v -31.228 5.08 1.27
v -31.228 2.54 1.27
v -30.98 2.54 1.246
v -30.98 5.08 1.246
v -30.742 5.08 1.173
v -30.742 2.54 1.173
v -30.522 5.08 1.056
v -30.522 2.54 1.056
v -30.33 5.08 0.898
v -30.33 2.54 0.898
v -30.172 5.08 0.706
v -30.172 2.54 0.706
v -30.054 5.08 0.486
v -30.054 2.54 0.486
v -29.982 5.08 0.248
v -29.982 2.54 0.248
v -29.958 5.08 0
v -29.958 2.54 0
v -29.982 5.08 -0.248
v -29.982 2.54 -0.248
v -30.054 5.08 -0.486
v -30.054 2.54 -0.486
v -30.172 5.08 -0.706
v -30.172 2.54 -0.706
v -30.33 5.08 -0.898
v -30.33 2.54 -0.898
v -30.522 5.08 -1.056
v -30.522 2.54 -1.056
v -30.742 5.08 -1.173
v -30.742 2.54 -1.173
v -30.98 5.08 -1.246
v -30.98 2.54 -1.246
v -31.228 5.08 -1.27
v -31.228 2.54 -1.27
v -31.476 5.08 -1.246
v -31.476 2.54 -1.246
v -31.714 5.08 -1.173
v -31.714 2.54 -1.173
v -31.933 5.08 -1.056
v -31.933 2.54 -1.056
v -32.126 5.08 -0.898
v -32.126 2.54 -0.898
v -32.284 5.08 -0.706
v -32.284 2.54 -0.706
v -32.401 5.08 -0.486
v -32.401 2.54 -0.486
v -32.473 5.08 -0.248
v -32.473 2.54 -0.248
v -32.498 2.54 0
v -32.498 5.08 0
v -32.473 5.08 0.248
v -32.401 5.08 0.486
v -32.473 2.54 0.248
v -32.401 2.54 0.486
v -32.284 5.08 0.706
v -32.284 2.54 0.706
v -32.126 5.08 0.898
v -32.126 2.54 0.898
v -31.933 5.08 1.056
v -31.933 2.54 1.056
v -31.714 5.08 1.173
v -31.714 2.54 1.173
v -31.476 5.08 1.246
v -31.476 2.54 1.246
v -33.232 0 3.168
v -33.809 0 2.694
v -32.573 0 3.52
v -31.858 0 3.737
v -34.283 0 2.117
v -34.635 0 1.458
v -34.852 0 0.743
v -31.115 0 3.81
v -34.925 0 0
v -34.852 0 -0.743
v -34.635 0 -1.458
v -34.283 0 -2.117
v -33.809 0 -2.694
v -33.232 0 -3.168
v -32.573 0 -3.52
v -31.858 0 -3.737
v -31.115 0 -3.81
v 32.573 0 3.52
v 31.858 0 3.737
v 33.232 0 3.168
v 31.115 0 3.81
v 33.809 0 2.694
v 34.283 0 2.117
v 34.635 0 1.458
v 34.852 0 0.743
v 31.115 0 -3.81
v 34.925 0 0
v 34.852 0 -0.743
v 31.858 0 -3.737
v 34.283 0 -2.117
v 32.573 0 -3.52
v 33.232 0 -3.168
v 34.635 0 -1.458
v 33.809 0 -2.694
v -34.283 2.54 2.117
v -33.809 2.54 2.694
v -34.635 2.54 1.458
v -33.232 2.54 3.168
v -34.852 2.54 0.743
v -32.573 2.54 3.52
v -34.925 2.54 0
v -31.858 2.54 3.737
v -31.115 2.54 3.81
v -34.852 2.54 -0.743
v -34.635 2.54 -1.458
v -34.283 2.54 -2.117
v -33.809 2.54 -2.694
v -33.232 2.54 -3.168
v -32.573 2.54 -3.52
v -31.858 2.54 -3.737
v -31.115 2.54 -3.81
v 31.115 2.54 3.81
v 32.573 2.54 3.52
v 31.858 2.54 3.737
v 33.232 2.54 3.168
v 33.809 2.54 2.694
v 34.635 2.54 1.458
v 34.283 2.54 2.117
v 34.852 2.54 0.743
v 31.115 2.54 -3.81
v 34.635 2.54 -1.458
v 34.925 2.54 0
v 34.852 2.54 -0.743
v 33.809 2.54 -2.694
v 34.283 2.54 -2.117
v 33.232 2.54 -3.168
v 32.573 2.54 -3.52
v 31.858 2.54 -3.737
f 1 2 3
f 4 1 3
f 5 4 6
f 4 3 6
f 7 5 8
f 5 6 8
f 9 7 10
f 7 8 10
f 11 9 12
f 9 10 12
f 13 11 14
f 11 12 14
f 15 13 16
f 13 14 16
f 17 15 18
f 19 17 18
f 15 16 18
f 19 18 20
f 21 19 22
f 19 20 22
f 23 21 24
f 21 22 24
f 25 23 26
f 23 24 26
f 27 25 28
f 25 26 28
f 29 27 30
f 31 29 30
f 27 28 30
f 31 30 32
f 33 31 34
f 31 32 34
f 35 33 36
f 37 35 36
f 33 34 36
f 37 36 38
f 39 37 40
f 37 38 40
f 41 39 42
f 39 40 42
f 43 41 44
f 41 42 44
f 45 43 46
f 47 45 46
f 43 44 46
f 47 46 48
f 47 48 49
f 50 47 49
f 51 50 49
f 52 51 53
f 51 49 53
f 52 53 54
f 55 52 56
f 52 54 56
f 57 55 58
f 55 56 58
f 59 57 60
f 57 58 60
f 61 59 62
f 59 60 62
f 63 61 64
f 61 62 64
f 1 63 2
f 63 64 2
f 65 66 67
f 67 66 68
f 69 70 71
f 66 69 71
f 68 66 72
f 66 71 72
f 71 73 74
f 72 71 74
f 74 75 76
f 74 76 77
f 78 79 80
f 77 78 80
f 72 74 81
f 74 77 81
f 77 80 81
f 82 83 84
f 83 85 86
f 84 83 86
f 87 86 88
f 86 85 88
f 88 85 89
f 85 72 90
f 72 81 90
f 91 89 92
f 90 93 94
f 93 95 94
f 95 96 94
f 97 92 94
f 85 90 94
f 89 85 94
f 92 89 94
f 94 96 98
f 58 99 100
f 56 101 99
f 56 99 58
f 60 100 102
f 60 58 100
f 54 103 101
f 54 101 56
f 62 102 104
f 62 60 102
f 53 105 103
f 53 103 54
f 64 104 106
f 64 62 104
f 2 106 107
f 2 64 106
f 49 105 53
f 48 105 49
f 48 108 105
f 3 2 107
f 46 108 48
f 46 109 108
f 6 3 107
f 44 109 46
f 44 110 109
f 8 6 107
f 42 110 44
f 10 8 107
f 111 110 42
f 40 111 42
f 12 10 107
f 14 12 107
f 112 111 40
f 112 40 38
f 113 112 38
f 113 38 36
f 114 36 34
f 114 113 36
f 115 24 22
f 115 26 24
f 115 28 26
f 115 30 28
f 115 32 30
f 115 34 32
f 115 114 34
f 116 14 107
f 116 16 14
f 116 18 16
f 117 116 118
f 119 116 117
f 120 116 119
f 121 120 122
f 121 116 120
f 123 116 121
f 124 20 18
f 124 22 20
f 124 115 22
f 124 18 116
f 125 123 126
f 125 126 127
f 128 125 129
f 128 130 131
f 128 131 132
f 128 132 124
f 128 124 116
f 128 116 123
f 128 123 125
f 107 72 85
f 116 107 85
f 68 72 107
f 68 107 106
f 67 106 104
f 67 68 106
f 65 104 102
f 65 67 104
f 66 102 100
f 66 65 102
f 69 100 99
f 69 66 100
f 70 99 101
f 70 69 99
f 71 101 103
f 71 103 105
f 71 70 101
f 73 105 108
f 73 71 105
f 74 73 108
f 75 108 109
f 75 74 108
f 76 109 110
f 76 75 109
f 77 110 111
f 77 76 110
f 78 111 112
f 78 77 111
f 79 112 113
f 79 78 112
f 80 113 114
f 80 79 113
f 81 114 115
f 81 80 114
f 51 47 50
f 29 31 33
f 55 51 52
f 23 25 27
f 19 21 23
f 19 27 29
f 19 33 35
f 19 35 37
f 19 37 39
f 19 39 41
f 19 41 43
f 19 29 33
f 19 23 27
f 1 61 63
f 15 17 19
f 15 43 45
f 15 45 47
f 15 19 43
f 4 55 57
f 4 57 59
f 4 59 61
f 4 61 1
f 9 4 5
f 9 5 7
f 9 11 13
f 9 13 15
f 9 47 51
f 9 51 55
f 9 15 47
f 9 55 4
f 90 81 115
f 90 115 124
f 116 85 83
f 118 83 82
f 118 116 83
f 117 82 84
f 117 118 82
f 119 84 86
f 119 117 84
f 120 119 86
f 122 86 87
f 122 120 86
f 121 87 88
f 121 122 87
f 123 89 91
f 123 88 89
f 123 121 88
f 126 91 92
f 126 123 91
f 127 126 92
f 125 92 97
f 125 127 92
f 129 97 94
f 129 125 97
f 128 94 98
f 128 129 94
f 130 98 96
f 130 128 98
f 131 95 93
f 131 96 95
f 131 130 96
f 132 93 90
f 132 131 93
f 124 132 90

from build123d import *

# Parameters (mm, degrees)
SKETCH2_W           = 69.85
SKETCH2_H           = 7.62
BOSS_EXTRUDE1_DEPTH = 2.54
FILLET1_RADIUS      = 3.81
FILLET1_LENGTH      = 2.54
FILLET2_RADIUS      = 3.81
FILLET2_LENGTH      = 2.54
SKETCH3_R           = 1.27
BOSS_EXTRUDE2_DEPTH = 2.54


with BuildPart() as part:
    # Sketch2 → Boss-Extrude1 (new body)
    with BuildSketch(Plane(origin=(0, 0, 0), x_dir=(1, 0, 0), z_dir=(0, 1, 0))):
        Rectangle(SKETCH2_W, SKETCH2_H)
    extrude(amount=BOSS_EXTRUDE1_DEPTH)

    # Fillet1: full round fillet: the end face becomes a half cylinder, R = half its width
    fillet1_face = Plane((34.925, 1.27, 0), x_dir=(0, 1, 0), z_dir=(1, 0, 0))  # on the end face: x along it, z out of the body
    fillet1_slab = fillet1_face.offset(-FILLET1_RADIUS / 2) * Box(FILLET1_LENGTH, 2 * FILLET1_RADIUS, FILLET1_RADIUS, mode=Mode.PRIVATE)  # the body's end, R deep
    fillet1_round = Plane((31.115, 1.27, 0), x_dir=(1, 0, 0), z_dir=(0, 1, 0)) * Cylinder(FILLET1_RADIUS, FILLET1_LENGTH, mode=Mode.PRIVATE)  # its axis R under the face
    add(fillet1_slab - fillet1_round, mode=Mode.SUBTRACT)

    # Fillet2: full round fillet: the end face becomes a half cylinder, R = half its width
    fillet2_face = Plane((-34.925, 1.27, 0), x_dir=(0, -1, 0), z_dir=(-1, 0, 0))  # on the end face: x along it, z out of the body
    fillet2_slab = fillet2_face.offset(-FILLET2_RADIUS / 2) * Box(FILLET2_LENGTH, 2 * FILLET2_RADIUS, FILLET2_RADIUS, mode=Mode.PRIVATE)  # the body's end, R deep
    fillet2_round = Plane((-31.115, 1.27, 0), x_dir=(-1, 0, 0), z_dir=(0, -1, 0)) * Cylinder(FILLET2_RADIUS, FILLET2_LENGTH, mode=Mode.PRIVATE)  # its axis R under the face
    add(fillet2_slab - fillet2_round, mode=Mode.SUBTRACT)

    # Sketch3 → Boss-Extrude2 (add)
    with BuildSketch(Plane(origin=(0, 2.54, 0), x_dir=(1, 0, 0), z_dir=(0, 1, 0))):
        with Locations(Location((-31.227747573, 0, 0), (0, 0, 270))):
            Circle(SKETCH3_R)
    extrude(amount=BOSS_EXTRUDE2_DEPTH)


solid = part.part
